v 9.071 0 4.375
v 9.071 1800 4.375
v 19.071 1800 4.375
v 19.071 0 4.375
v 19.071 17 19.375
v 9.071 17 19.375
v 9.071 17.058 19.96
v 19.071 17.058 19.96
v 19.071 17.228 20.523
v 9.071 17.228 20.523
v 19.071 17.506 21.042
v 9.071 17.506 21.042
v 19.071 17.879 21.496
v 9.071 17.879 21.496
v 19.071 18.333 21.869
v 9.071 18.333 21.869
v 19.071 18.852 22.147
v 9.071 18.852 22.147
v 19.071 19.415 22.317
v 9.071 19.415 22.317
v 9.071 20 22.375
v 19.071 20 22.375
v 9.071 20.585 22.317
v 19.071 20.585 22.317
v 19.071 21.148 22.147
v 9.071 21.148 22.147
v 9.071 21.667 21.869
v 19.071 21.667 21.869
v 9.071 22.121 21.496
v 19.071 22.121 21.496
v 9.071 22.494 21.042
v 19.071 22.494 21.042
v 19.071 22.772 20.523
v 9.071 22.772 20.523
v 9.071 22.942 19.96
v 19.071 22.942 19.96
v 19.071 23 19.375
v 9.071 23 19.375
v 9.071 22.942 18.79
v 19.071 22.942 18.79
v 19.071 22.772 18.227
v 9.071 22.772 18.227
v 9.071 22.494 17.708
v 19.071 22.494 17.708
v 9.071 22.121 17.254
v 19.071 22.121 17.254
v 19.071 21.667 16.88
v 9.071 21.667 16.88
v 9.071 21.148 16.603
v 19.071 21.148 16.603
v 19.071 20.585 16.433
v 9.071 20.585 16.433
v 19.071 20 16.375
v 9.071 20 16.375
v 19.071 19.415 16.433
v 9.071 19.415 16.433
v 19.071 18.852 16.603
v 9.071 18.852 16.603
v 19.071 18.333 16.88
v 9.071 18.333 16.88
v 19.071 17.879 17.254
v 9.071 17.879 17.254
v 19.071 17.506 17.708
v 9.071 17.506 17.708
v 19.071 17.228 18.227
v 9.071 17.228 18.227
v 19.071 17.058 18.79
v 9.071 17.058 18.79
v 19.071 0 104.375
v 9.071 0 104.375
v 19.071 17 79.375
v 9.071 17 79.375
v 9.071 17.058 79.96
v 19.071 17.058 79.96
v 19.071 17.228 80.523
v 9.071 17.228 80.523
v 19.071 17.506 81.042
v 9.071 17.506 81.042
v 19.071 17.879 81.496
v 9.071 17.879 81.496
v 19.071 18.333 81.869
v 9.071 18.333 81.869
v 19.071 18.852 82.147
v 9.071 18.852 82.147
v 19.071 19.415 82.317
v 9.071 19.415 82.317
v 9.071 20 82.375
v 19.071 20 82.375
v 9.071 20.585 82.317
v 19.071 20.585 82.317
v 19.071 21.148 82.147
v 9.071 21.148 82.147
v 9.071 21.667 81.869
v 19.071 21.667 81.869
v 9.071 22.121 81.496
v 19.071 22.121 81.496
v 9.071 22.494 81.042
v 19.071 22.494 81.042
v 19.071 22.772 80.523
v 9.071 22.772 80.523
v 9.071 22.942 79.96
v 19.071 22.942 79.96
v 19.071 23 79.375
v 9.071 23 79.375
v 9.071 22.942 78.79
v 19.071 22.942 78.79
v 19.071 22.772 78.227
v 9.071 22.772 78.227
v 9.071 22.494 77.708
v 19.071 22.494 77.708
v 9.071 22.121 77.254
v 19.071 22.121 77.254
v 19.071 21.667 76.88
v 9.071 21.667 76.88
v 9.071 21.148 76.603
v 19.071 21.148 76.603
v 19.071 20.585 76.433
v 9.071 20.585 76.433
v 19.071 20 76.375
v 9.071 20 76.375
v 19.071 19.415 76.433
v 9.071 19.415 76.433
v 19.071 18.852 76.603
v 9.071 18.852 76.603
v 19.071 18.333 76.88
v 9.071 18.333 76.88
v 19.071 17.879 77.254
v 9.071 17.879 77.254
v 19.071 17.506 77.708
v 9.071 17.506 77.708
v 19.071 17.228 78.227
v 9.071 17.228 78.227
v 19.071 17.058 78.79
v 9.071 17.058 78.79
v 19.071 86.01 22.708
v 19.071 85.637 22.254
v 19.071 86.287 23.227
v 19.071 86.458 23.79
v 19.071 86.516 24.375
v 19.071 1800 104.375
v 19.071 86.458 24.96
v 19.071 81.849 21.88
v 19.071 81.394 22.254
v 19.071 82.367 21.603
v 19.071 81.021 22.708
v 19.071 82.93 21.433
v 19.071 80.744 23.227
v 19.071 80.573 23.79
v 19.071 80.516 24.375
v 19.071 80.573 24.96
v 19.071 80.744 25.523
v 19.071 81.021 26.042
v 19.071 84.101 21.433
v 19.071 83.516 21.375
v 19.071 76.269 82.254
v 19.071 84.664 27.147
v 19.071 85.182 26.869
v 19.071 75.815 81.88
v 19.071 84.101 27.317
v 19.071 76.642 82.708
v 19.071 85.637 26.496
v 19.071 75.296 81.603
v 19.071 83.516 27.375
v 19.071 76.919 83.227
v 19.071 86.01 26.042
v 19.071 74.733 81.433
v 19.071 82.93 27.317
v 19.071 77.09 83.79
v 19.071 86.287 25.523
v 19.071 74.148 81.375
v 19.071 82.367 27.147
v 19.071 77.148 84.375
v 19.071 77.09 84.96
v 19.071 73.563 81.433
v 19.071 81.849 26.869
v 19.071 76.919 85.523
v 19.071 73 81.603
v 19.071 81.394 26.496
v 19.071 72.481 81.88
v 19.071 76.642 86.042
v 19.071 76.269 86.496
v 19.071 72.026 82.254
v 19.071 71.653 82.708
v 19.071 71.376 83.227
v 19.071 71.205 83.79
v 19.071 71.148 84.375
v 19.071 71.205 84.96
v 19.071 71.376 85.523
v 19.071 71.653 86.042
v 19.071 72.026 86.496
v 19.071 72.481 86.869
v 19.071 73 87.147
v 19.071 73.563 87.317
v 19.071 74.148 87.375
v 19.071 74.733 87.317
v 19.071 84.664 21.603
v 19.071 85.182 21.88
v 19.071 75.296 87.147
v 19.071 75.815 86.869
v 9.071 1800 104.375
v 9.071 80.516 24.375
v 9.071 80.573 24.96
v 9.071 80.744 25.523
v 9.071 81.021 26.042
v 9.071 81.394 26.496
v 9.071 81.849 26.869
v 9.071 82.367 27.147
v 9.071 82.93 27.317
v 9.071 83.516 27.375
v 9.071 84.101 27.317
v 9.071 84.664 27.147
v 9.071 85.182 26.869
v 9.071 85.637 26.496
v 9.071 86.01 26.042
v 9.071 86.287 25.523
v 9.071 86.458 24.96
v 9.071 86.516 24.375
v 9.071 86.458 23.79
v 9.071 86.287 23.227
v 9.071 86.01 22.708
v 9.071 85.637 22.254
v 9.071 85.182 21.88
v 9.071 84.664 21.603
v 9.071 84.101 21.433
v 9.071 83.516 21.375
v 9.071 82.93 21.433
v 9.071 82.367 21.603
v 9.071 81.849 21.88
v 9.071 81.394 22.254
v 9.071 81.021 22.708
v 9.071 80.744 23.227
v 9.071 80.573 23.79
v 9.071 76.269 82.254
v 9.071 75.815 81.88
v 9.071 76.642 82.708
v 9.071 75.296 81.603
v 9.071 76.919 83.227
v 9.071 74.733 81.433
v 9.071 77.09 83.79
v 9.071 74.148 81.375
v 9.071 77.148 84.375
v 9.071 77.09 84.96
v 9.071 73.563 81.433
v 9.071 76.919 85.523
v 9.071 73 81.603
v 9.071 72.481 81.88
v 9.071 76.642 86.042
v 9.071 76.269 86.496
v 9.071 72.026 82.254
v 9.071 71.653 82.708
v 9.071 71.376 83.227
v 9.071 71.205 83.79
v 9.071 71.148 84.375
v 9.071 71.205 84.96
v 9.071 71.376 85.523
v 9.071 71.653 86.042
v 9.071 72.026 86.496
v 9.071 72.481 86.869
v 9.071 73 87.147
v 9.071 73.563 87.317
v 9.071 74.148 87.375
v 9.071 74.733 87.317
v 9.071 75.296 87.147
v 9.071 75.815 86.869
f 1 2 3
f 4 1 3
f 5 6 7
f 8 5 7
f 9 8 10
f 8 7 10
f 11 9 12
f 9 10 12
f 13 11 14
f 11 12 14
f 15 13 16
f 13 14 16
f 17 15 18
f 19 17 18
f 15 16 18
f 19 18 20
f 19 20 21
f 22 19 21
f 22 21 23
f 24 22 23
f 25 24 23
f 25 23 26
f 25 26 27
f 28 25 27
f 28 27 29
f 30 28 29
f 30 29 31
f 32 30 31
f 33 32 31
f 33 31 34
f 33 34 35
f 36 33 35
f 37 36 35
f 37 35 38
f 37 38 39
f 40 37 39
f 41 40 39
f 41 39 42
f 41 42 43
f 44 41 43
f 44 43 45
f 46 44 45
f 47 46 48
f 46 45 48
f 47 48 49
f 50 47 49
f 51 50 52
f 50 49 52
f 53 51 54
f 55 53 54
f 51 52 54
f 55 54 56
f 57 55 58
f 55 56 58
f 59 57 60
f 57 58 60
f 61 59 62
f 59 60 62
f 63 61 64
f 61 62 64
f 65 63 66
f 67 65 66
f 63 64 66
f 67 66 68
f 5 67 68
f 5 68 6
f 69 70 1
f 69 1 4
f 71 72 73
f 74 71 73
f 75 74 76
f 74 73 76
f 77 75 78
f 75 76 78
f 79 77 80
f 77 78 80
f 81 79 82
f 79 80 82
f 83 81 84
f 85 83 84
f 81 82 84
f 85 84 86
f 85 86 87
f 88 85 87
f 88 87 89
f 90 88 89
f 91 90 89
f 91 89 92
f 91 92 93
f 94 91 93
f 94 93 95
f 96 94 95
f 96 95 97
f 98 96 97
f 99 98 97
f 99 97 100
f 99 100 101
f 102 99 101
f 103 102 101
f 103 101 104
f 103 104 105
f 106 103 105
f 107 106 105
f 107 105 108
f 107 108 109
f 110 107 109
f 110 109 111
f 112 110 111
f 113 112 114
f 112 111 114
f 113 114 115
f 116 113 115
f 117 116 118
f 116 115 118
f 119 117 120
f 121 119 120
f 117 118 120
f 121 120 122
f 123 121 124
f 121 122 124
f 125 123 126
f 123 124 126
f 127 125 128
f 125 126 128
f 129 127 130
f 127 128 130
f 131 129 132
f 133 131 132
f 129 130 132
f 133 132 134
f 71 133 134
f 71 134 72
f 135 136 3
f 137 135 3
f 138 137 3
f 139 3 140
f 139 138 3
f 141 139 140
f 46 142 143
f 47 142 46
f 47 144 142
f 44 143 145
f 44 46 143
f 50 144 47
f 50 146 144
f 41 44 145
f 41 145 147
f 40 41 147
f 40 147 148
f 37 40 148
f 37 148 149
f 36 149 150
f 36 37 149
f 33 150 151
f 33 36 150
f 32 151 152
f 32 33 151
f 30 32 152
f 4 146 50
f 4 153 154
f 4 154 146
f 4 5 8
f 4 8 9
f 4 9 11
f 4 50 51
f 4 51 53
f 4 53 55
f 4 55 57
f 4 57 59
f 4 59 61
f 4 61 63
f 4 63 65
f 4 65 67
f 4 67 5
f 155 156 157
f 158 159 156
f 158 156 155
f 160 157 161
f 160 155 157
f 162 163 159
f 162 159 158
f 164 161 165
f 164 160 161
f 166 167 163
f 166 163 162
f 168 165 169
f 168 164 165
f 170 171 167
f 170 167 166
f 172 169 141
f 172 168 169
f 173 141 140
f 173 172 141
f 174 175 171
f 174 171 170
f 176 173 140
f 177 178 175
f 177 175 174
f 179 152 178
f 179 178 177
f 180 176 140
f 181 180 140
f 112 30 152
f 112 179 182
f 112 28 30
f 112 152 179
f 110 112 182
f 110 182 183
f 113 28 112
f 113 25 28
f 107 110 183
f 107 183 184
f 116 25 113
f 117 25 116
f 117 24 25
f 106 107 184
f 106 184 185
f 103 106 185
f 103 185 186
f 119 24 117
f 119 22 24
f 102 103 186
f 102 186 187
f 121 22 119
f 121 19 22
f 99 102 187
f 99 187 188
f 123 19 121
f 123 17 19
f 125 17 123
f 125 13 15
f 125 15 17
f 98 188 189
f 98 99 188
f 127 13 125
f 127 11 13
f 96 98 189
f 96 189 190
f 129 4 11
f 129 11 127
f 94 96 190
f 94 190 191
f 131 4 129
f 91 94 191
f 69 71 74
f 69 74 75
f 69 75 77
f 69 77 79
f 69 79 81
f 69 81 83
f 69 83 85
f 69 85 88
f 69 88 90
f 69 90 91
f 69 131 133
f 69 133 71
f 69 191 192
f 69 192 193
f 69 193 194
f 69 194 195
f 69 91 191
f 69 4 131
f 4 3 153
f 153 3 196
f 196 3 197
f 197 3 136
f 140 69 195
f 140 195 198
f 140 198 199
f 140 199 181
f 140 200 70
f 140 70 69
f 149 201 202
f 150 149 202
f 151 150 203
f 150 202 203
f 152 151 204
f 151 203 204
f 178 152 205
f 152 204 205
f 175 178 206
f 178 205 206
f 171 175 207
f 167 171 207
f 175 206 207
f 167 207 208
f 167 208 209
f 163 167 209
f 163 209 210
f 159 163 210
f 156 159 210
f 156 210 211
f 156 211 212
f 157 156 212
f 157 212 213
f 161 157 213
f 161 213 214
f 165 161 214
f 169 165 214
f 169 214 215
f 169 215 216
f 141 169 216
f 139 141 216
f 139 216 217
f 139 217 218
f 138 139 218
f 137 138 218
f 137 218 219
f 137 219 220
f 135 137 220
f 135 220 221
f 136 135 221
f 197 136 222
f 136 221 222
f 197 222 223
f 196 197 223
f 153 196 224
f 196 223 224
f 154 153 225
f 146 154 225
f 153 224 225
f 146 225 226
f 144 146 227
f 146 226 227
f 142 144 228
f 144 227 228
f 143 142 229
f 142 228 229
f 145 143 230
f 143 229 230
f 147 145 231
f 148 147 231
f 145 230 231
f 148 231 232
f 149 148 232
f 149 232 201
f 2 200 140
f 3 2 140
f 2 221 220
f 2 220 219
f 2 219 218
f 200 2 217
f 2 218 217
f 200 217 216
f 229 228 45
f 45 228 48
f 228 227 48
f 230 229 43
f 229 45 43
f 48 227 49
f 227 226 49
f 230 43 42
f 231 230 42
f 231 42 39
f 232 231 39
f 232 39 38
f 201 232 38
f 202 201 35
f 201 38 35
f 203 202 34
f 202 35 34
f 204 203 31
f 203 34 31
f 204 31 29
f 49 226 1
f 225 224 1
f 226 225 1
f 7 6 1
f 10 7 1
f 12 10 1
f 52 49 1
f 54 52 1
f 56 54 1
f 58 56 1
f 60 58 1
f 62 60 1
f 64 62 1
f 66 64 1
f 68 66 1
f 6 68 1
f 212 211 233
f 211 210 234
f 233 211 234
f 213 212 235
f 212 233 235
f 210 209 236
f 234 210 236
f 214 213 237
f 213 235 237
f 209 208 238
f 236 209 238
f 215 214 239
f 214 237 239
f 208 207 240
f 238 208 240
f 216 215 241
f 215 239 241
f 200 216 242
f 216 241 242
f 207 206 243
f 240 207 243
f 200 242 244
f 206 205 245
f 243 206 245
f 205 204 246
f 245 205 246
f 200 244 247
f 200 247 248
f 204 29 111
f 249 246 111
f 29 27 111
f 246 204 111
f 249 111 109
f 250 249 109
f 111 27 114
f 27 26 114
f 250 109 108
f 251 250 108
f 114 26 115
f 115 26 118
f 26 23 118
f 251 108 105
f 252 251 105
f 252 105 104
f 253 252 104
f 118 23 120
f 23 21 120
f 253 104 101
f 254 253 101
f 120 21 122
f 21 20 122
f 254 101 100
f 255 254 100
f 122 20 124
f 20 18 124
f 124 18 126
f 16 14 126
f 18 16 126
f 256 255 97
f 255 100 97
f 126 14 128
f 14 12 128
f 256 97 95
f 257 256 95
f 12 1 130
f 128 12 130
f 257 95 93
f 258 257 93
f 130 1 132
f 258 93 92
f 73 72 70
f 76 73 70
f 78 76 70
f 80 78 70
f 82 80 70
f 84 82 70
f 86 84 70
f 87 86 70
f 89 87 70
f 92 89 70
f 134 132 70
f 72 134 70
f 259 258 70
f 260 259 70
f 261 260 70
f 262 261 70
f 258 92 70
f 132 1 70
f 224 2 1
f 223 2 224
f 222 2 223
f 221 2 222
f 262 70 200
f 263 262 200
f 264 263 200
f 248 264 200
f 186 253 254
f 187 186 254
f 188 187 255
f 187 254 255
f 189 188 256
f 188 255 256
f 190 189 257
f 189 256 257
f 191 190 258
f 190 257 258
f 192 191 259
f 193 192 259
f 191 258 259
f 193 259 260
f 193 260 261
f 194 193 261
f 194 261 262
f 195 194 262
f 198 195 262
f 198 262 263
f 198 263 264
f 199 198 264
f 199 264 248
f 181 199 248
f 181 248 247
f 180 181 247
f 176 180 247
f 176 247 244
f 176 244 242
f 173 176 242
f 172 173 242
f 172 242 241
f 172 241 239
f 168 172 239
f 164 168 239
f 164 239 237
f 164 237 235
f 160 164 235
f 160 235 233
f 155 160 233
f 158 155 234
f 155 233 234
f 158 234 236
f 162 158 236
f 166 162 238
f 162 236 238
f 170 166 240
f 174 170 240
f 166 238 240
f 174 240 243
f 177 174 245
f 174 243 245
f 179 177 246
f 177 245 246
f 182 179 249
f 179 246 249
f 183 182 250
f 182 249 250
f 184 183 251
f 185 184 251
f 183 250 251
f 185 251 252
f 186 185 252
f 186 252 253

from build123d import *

# Parameters (mm, degrees)
F0_W     = 10
F0_H     = 100
F1_DEPTH = 1800
F4_D     = 6


with BuildPart() as f1:
    # F0 (on Front) → F1 (new body)
    with BuildSketch(Plane.XZ):
        with Locations((14.071317, 54.374899)):
            Rectangle(F0_W, F0_H)
    extrude(amount=-F1_DEPTH)

    # F4 (through all)
    with Locations(Plane.YZ.offset(19.071317)):
        with Locations((20, 79.374899), (20, 19.374899), (74.147792, 84.374899), (83.515501, 24.374899)):
            Hole(F4_D / 2)


solid = f1.part
